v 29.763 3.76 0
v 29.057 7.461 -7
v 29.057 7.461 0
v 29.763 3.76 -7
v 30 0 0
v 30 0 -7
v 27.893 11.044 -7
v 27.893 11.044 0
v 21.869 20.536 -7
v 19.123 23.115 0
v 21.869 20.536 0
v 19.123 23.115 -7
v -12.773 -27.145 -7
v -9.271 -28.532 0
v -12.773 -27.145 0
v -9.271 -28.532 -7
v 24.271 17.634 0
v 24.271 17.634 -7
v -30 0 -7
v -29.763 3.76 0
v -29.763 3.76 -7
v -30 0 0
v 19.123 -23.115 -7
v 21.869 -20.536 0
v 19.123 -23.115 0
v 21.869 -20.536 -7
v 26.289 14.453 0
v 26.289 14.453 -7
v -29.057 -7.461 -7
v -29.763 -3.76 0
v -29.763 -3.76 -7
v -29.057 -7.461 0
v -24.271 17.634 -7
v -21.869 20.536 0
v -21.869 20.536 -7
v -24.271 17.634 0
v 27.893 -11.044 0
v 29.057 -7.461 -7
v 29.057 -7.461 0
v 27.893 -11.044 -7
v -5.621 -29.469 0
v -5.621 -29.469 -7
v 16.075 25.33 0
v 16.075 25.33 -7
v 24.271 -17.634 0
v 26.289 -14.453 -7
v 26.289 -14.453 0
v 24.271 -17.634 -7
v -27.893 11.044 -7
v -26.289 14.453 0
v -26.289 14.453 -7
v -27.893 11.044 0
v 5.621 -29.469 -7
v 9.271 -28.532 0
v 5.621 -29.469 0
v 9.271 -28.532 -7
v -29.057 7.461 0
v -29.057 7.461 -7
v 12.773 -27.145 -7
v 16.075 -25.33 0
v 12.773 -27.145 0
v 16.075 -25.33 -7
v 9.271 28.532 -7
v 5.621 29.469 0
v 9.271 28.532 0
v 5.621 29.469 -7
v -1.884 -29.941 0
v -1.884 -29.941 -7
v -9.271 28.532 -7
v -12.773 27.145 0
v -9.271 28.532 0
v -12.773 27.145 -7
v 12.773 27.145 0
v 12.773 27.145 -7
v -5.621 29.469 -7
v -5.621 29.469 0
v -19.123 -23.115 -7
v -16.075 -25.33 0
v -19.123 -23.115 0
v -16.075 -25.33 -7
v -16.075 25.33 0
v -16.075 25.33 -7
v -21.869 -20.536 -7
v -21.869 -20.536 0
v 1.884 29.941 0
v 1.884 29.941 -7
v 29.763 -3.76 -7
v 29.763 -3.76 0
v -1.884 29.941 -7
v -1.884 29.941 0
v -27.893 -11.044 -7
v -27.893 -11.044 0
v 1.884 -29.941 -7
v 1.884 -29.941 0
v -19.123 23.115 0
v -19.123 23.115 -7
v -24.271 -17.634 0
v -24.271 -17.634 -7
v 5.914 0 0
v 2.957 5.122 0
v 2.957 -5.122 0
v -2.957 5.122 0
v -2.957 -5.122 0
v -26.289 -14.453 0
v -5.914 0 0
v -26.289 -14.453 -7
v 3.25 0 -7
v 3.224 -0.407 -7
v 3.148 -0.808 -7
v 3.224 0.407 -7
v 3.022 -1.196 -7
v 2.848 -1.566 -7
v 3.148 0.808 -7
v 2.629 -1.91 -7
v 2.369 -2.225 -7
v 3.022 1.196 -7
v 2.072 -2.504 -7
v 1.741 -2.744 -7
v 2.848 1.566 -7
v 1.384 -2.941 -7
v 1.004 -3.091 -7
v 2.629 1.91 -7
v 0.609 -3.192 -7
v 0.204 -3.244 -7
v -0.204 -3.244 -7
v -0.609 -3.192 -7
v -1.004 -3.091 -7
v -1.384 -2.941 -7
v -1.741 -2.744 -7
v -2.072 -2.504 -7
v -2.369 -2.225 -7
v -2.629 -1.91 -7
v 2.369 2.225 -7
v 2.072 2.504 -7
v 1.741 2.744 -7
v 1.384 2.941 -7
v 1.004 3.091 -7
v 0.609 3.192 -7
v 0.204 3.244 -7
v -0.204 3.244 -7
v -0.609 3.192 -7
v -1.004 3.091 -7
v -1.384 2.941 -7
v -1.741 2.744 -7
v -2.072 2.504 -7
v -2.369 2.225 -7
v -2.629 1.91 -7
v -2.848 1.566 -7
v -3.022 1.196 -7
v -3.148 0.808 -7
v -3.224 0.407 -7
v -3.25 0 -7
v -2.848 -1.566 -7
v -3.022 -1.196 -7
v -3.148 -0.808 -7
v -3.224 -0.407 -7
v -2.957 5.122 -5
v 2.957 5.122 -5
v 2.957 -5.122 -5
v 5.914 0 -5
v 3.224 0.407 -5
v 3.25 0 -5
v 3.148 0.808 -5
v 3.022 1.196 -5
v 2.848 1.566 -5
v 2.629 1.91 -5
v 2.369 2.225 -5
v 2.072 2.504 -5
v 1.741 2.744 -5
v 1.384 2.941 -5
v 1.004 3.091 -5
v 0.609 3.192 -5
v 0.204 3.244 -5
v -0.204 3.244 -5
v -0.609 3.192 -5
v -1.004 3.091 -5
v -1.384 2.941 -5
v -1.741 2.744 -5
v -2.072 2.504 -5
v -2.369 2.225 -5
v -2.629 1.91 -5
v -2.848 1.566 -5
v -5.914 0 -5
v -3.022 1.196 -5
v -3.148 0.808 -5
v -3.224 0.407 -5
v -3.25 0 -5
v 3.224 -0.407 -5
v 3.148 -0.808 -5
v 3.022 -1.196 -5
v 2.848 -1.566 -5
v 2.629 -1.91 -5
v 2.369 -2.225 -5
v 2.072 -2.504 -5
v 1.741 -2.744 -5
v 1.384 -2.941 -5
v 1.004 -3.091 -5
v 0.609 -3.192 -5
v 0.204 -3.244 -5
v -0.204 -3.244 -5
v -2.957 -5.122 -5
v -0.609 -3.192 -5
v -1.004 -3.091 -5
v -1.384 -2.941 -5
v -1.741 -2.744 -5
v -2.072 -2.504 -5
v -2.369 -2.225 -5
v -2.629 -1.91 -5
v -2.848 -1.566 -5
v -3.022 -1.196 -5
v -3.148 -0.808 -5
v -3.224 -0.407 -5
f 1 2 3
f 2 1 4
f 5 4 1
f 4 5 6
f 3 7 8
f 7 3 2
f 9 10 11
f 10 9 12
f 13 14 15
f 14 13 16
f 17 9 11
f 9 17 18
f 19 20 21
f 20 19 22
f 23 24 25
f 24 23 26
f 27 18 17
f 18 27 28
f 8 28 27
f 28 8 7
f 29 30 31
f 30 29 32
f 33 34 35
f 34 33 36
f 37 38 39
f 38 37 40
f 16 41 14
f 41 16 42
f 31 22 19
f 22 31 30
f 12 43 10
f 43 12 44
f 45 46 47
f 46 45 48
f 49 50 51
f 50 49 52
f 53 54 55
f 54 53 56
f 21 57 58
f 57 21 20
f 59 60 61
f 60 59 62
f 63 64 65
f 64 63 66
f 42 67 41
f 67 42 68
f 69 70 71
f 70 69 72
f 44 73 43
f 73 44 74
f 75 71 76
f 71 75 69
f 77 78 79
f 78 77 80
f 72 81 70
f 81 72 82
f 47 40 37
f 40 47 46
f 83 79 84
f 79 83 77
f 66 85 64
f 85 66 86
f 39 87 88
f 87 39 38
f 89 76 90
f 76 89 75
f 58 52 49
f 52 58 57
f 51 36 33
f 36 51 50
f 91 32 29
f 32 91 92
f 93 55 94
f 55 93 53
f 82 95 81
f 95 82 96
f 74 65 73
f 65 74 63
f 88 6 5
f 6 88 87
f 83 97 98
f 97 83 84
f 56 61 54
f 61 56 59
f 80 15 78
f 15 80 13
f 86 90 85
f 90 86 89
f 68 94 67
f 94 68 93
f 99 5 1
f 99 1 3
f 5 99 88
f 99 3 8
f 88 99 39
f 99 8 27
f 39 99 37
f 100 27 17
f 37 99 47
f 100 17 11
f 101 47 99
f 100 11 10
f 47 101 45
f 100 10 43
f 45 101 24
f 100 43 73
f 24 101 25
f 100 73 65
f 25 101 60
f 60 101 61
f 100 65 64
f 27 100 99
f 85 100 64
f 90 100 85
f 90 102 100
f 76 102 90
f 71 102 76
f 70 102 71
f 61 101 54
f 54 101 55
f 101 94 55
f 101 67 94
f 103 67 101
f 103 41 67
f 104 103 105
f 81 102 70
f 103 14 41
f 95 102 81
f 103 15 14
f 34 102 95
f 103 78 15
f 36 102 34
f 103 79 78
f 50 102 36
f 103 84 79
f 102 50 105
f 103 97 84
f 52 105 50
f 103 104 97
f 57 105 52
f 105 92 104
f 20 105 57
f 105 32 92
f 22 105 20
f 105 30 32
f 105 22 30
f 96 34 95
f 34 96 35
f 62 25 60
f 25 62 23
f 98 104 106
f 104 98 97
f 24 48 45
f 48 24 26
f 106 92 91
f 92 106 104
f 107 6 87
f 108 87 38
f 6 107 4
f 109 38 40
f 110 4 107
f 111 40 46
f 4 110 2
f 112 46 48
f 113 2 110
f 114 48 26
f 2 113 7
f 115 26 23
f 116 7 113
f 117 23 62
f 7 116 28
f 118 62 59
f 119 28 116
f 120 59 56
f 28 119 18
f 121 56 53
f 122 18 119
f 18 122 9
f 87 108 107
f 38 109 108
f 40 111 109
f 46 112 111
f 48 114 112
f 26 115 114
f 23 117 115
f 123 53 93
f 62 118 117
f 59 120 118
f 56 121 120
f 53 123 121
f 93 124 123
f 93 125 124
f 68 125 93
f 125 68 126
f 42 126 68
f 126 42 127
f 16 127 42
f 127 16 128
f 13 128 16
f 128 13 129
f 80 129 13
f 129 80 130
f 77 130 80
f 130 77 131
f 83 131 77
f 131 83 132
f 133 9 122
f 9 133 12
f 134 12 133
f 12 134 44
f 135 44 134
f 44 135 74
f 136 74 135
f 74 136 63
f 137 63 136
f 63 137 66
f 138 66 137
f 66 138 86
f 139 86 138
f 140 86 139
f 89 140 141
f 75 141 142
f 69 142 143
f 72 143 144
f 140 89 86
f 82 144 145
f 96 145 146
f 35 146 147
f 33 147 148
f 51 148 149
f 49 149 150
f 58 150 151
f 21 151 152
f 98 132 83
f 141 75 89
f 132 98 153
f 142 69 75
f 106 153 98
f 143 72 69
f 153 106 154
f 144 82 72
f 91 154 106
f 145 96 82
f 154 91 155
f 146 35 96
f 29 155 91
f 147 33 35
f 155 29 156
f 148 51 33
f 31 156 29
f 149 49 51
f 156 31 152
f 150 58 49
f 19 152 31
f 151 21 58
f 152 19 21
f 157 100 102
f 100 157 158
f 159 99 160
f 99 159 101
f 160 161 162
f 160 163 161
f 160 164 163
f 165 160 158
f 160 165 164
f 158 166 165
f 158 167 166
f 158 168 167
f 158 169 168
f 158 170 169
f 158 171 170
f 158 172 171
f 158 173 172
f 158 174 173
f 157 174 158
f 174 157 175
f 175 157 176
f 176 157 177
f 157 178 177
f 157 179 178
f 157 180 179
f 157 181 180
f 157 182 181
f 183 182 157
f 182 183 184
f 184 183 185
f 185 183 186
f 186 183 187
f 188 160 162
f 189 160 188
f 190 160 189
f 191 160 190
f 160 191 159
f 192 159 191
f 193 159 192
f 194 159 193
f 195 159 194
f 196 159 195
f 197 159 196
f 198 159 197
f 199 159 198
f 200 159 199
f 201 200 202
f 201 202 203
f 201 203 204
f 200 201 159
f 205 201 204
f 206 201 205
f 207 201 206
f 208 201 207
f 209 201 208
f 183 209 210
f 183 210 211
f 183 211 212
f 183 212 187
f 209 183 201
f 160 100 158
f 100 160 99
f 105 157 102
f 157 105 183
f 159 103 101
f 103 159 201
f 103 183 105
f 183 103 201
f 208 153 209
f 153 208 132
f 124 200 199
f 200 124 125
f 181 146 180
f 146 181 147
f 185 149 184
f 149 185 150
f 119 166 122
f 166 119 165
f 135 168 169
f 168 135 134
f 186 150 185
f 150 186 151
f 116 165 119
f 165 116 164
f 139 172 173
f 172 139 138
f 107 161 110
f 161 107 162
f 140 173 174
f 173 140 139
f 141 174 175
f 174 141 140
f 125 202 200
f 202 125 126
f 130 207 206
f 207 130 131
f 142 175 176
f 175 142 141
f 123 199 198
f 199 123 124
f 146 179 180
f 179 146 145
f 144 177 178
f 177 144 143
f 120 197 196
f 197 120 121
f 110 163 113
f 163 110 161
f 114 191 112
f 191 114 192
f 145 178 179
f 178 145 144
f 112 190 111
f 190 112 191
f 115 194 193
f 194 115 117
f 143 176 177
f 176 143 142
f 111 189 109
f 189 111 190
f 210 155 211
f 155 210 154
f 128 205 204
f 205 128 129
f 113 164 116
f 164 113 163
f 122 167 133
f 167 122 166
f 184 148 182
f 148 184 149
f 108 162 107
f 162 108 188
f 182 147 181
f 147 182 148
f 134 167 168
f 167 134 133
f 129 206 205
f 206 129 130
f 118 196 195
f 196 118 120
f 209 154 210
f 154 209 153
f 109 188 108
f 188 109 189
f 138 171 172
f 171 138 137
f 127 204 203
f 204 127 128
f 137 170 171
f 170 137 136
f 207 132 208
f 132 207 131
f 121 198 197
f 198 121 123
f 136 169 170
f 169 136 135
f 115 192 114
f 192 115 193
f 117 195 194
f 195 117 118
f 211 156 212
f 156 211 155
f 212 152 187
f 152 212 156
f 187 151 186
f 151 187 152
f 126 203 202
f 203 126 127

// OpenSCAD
$fn = 50;


difference() {
	union() {
		translate(v = [0, 0, -7.0000000000]) {
			cylinder(h = 7.0000000000, r = 30.0000000000);
		}
		translate(v = [0, 0, -5.5000000000]) {
			cylinder(h = 5.5000000000, r = 2.8750000000);
		}
	}
	union() {
		translate(v = [0, 0, 0]) {
			rotate(a = [0, 0, 0]) {
				difference() {
					union() {
						translate(v = [0, 0, -5]) {
							linear_extrude(height = 5) {
								polygon(points = [[5.9142500000, 0.0000000000], [2.9571250000, 5.1218907443], [-2.9571250000, 5.1218907443], [-5.9142500000, 0.0000000000], [-2.9571250000, -5.1218907443], [2.9571250000, -5.1218907443]]);
							}
						}
					}
					union();
				}
			}
		}
		#translate(v = [0, 0, -100.0000000000]) {
			cylinder(h = 200, r = 3.2500000000);
		}
	}
}
